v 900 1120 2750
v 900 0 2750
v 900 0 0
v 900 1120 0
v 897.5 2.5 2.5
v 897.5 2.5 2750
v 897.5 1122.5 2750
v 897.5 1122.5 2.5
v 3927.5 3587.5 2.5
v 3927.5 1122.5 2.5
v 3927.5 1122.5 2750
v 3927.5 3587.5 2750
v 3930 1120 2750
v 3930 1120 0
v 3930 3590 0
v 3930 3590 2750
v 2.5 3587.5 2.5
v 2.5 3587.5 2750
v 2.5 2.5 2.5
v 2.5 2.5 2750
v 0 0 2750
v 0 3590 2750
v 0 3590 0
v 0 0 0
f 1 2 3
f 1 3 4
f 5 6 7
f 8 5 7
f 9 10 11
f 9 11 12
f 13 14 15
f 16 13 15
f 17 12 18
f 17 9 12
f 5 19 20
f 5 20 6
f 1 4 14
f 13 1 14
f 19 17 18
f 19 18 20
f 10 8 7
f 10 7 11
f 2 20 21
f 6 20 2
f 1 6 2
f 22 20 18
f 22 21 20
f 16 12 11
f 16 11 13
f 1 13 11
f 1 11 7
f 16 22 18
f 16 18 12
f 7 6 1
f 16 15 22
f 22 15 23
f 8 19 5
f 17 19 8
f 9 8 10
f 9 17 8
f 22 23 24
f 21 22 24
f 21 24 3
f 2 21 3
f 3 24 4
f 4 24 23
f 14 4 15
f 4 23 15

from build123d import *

# Parameters (mm, degrees)
F1_DEPTH = 2750
F2_T     = -2.5


with BuildPart() as f1:
    # F0 (on Top) → F1 (new body)
    with BuildSketch(Plane.XY):
        Polygon((0, 3590), (0, 0), (900, 0), (900, 1120), (3930, 1120), (3930, 3590), align=None)
    extrude(amount=F1_DEPTH)

    # F2
    f2_openings = [f1.faces().sort_by_distance(p)[0] for p in [
        (1822.479632, 2186.139233, 2750),
    ]]
    offset(amount=F2_T, openings=f2_openings, kind=Kind.INTERSECTION)


solid = f1.part
